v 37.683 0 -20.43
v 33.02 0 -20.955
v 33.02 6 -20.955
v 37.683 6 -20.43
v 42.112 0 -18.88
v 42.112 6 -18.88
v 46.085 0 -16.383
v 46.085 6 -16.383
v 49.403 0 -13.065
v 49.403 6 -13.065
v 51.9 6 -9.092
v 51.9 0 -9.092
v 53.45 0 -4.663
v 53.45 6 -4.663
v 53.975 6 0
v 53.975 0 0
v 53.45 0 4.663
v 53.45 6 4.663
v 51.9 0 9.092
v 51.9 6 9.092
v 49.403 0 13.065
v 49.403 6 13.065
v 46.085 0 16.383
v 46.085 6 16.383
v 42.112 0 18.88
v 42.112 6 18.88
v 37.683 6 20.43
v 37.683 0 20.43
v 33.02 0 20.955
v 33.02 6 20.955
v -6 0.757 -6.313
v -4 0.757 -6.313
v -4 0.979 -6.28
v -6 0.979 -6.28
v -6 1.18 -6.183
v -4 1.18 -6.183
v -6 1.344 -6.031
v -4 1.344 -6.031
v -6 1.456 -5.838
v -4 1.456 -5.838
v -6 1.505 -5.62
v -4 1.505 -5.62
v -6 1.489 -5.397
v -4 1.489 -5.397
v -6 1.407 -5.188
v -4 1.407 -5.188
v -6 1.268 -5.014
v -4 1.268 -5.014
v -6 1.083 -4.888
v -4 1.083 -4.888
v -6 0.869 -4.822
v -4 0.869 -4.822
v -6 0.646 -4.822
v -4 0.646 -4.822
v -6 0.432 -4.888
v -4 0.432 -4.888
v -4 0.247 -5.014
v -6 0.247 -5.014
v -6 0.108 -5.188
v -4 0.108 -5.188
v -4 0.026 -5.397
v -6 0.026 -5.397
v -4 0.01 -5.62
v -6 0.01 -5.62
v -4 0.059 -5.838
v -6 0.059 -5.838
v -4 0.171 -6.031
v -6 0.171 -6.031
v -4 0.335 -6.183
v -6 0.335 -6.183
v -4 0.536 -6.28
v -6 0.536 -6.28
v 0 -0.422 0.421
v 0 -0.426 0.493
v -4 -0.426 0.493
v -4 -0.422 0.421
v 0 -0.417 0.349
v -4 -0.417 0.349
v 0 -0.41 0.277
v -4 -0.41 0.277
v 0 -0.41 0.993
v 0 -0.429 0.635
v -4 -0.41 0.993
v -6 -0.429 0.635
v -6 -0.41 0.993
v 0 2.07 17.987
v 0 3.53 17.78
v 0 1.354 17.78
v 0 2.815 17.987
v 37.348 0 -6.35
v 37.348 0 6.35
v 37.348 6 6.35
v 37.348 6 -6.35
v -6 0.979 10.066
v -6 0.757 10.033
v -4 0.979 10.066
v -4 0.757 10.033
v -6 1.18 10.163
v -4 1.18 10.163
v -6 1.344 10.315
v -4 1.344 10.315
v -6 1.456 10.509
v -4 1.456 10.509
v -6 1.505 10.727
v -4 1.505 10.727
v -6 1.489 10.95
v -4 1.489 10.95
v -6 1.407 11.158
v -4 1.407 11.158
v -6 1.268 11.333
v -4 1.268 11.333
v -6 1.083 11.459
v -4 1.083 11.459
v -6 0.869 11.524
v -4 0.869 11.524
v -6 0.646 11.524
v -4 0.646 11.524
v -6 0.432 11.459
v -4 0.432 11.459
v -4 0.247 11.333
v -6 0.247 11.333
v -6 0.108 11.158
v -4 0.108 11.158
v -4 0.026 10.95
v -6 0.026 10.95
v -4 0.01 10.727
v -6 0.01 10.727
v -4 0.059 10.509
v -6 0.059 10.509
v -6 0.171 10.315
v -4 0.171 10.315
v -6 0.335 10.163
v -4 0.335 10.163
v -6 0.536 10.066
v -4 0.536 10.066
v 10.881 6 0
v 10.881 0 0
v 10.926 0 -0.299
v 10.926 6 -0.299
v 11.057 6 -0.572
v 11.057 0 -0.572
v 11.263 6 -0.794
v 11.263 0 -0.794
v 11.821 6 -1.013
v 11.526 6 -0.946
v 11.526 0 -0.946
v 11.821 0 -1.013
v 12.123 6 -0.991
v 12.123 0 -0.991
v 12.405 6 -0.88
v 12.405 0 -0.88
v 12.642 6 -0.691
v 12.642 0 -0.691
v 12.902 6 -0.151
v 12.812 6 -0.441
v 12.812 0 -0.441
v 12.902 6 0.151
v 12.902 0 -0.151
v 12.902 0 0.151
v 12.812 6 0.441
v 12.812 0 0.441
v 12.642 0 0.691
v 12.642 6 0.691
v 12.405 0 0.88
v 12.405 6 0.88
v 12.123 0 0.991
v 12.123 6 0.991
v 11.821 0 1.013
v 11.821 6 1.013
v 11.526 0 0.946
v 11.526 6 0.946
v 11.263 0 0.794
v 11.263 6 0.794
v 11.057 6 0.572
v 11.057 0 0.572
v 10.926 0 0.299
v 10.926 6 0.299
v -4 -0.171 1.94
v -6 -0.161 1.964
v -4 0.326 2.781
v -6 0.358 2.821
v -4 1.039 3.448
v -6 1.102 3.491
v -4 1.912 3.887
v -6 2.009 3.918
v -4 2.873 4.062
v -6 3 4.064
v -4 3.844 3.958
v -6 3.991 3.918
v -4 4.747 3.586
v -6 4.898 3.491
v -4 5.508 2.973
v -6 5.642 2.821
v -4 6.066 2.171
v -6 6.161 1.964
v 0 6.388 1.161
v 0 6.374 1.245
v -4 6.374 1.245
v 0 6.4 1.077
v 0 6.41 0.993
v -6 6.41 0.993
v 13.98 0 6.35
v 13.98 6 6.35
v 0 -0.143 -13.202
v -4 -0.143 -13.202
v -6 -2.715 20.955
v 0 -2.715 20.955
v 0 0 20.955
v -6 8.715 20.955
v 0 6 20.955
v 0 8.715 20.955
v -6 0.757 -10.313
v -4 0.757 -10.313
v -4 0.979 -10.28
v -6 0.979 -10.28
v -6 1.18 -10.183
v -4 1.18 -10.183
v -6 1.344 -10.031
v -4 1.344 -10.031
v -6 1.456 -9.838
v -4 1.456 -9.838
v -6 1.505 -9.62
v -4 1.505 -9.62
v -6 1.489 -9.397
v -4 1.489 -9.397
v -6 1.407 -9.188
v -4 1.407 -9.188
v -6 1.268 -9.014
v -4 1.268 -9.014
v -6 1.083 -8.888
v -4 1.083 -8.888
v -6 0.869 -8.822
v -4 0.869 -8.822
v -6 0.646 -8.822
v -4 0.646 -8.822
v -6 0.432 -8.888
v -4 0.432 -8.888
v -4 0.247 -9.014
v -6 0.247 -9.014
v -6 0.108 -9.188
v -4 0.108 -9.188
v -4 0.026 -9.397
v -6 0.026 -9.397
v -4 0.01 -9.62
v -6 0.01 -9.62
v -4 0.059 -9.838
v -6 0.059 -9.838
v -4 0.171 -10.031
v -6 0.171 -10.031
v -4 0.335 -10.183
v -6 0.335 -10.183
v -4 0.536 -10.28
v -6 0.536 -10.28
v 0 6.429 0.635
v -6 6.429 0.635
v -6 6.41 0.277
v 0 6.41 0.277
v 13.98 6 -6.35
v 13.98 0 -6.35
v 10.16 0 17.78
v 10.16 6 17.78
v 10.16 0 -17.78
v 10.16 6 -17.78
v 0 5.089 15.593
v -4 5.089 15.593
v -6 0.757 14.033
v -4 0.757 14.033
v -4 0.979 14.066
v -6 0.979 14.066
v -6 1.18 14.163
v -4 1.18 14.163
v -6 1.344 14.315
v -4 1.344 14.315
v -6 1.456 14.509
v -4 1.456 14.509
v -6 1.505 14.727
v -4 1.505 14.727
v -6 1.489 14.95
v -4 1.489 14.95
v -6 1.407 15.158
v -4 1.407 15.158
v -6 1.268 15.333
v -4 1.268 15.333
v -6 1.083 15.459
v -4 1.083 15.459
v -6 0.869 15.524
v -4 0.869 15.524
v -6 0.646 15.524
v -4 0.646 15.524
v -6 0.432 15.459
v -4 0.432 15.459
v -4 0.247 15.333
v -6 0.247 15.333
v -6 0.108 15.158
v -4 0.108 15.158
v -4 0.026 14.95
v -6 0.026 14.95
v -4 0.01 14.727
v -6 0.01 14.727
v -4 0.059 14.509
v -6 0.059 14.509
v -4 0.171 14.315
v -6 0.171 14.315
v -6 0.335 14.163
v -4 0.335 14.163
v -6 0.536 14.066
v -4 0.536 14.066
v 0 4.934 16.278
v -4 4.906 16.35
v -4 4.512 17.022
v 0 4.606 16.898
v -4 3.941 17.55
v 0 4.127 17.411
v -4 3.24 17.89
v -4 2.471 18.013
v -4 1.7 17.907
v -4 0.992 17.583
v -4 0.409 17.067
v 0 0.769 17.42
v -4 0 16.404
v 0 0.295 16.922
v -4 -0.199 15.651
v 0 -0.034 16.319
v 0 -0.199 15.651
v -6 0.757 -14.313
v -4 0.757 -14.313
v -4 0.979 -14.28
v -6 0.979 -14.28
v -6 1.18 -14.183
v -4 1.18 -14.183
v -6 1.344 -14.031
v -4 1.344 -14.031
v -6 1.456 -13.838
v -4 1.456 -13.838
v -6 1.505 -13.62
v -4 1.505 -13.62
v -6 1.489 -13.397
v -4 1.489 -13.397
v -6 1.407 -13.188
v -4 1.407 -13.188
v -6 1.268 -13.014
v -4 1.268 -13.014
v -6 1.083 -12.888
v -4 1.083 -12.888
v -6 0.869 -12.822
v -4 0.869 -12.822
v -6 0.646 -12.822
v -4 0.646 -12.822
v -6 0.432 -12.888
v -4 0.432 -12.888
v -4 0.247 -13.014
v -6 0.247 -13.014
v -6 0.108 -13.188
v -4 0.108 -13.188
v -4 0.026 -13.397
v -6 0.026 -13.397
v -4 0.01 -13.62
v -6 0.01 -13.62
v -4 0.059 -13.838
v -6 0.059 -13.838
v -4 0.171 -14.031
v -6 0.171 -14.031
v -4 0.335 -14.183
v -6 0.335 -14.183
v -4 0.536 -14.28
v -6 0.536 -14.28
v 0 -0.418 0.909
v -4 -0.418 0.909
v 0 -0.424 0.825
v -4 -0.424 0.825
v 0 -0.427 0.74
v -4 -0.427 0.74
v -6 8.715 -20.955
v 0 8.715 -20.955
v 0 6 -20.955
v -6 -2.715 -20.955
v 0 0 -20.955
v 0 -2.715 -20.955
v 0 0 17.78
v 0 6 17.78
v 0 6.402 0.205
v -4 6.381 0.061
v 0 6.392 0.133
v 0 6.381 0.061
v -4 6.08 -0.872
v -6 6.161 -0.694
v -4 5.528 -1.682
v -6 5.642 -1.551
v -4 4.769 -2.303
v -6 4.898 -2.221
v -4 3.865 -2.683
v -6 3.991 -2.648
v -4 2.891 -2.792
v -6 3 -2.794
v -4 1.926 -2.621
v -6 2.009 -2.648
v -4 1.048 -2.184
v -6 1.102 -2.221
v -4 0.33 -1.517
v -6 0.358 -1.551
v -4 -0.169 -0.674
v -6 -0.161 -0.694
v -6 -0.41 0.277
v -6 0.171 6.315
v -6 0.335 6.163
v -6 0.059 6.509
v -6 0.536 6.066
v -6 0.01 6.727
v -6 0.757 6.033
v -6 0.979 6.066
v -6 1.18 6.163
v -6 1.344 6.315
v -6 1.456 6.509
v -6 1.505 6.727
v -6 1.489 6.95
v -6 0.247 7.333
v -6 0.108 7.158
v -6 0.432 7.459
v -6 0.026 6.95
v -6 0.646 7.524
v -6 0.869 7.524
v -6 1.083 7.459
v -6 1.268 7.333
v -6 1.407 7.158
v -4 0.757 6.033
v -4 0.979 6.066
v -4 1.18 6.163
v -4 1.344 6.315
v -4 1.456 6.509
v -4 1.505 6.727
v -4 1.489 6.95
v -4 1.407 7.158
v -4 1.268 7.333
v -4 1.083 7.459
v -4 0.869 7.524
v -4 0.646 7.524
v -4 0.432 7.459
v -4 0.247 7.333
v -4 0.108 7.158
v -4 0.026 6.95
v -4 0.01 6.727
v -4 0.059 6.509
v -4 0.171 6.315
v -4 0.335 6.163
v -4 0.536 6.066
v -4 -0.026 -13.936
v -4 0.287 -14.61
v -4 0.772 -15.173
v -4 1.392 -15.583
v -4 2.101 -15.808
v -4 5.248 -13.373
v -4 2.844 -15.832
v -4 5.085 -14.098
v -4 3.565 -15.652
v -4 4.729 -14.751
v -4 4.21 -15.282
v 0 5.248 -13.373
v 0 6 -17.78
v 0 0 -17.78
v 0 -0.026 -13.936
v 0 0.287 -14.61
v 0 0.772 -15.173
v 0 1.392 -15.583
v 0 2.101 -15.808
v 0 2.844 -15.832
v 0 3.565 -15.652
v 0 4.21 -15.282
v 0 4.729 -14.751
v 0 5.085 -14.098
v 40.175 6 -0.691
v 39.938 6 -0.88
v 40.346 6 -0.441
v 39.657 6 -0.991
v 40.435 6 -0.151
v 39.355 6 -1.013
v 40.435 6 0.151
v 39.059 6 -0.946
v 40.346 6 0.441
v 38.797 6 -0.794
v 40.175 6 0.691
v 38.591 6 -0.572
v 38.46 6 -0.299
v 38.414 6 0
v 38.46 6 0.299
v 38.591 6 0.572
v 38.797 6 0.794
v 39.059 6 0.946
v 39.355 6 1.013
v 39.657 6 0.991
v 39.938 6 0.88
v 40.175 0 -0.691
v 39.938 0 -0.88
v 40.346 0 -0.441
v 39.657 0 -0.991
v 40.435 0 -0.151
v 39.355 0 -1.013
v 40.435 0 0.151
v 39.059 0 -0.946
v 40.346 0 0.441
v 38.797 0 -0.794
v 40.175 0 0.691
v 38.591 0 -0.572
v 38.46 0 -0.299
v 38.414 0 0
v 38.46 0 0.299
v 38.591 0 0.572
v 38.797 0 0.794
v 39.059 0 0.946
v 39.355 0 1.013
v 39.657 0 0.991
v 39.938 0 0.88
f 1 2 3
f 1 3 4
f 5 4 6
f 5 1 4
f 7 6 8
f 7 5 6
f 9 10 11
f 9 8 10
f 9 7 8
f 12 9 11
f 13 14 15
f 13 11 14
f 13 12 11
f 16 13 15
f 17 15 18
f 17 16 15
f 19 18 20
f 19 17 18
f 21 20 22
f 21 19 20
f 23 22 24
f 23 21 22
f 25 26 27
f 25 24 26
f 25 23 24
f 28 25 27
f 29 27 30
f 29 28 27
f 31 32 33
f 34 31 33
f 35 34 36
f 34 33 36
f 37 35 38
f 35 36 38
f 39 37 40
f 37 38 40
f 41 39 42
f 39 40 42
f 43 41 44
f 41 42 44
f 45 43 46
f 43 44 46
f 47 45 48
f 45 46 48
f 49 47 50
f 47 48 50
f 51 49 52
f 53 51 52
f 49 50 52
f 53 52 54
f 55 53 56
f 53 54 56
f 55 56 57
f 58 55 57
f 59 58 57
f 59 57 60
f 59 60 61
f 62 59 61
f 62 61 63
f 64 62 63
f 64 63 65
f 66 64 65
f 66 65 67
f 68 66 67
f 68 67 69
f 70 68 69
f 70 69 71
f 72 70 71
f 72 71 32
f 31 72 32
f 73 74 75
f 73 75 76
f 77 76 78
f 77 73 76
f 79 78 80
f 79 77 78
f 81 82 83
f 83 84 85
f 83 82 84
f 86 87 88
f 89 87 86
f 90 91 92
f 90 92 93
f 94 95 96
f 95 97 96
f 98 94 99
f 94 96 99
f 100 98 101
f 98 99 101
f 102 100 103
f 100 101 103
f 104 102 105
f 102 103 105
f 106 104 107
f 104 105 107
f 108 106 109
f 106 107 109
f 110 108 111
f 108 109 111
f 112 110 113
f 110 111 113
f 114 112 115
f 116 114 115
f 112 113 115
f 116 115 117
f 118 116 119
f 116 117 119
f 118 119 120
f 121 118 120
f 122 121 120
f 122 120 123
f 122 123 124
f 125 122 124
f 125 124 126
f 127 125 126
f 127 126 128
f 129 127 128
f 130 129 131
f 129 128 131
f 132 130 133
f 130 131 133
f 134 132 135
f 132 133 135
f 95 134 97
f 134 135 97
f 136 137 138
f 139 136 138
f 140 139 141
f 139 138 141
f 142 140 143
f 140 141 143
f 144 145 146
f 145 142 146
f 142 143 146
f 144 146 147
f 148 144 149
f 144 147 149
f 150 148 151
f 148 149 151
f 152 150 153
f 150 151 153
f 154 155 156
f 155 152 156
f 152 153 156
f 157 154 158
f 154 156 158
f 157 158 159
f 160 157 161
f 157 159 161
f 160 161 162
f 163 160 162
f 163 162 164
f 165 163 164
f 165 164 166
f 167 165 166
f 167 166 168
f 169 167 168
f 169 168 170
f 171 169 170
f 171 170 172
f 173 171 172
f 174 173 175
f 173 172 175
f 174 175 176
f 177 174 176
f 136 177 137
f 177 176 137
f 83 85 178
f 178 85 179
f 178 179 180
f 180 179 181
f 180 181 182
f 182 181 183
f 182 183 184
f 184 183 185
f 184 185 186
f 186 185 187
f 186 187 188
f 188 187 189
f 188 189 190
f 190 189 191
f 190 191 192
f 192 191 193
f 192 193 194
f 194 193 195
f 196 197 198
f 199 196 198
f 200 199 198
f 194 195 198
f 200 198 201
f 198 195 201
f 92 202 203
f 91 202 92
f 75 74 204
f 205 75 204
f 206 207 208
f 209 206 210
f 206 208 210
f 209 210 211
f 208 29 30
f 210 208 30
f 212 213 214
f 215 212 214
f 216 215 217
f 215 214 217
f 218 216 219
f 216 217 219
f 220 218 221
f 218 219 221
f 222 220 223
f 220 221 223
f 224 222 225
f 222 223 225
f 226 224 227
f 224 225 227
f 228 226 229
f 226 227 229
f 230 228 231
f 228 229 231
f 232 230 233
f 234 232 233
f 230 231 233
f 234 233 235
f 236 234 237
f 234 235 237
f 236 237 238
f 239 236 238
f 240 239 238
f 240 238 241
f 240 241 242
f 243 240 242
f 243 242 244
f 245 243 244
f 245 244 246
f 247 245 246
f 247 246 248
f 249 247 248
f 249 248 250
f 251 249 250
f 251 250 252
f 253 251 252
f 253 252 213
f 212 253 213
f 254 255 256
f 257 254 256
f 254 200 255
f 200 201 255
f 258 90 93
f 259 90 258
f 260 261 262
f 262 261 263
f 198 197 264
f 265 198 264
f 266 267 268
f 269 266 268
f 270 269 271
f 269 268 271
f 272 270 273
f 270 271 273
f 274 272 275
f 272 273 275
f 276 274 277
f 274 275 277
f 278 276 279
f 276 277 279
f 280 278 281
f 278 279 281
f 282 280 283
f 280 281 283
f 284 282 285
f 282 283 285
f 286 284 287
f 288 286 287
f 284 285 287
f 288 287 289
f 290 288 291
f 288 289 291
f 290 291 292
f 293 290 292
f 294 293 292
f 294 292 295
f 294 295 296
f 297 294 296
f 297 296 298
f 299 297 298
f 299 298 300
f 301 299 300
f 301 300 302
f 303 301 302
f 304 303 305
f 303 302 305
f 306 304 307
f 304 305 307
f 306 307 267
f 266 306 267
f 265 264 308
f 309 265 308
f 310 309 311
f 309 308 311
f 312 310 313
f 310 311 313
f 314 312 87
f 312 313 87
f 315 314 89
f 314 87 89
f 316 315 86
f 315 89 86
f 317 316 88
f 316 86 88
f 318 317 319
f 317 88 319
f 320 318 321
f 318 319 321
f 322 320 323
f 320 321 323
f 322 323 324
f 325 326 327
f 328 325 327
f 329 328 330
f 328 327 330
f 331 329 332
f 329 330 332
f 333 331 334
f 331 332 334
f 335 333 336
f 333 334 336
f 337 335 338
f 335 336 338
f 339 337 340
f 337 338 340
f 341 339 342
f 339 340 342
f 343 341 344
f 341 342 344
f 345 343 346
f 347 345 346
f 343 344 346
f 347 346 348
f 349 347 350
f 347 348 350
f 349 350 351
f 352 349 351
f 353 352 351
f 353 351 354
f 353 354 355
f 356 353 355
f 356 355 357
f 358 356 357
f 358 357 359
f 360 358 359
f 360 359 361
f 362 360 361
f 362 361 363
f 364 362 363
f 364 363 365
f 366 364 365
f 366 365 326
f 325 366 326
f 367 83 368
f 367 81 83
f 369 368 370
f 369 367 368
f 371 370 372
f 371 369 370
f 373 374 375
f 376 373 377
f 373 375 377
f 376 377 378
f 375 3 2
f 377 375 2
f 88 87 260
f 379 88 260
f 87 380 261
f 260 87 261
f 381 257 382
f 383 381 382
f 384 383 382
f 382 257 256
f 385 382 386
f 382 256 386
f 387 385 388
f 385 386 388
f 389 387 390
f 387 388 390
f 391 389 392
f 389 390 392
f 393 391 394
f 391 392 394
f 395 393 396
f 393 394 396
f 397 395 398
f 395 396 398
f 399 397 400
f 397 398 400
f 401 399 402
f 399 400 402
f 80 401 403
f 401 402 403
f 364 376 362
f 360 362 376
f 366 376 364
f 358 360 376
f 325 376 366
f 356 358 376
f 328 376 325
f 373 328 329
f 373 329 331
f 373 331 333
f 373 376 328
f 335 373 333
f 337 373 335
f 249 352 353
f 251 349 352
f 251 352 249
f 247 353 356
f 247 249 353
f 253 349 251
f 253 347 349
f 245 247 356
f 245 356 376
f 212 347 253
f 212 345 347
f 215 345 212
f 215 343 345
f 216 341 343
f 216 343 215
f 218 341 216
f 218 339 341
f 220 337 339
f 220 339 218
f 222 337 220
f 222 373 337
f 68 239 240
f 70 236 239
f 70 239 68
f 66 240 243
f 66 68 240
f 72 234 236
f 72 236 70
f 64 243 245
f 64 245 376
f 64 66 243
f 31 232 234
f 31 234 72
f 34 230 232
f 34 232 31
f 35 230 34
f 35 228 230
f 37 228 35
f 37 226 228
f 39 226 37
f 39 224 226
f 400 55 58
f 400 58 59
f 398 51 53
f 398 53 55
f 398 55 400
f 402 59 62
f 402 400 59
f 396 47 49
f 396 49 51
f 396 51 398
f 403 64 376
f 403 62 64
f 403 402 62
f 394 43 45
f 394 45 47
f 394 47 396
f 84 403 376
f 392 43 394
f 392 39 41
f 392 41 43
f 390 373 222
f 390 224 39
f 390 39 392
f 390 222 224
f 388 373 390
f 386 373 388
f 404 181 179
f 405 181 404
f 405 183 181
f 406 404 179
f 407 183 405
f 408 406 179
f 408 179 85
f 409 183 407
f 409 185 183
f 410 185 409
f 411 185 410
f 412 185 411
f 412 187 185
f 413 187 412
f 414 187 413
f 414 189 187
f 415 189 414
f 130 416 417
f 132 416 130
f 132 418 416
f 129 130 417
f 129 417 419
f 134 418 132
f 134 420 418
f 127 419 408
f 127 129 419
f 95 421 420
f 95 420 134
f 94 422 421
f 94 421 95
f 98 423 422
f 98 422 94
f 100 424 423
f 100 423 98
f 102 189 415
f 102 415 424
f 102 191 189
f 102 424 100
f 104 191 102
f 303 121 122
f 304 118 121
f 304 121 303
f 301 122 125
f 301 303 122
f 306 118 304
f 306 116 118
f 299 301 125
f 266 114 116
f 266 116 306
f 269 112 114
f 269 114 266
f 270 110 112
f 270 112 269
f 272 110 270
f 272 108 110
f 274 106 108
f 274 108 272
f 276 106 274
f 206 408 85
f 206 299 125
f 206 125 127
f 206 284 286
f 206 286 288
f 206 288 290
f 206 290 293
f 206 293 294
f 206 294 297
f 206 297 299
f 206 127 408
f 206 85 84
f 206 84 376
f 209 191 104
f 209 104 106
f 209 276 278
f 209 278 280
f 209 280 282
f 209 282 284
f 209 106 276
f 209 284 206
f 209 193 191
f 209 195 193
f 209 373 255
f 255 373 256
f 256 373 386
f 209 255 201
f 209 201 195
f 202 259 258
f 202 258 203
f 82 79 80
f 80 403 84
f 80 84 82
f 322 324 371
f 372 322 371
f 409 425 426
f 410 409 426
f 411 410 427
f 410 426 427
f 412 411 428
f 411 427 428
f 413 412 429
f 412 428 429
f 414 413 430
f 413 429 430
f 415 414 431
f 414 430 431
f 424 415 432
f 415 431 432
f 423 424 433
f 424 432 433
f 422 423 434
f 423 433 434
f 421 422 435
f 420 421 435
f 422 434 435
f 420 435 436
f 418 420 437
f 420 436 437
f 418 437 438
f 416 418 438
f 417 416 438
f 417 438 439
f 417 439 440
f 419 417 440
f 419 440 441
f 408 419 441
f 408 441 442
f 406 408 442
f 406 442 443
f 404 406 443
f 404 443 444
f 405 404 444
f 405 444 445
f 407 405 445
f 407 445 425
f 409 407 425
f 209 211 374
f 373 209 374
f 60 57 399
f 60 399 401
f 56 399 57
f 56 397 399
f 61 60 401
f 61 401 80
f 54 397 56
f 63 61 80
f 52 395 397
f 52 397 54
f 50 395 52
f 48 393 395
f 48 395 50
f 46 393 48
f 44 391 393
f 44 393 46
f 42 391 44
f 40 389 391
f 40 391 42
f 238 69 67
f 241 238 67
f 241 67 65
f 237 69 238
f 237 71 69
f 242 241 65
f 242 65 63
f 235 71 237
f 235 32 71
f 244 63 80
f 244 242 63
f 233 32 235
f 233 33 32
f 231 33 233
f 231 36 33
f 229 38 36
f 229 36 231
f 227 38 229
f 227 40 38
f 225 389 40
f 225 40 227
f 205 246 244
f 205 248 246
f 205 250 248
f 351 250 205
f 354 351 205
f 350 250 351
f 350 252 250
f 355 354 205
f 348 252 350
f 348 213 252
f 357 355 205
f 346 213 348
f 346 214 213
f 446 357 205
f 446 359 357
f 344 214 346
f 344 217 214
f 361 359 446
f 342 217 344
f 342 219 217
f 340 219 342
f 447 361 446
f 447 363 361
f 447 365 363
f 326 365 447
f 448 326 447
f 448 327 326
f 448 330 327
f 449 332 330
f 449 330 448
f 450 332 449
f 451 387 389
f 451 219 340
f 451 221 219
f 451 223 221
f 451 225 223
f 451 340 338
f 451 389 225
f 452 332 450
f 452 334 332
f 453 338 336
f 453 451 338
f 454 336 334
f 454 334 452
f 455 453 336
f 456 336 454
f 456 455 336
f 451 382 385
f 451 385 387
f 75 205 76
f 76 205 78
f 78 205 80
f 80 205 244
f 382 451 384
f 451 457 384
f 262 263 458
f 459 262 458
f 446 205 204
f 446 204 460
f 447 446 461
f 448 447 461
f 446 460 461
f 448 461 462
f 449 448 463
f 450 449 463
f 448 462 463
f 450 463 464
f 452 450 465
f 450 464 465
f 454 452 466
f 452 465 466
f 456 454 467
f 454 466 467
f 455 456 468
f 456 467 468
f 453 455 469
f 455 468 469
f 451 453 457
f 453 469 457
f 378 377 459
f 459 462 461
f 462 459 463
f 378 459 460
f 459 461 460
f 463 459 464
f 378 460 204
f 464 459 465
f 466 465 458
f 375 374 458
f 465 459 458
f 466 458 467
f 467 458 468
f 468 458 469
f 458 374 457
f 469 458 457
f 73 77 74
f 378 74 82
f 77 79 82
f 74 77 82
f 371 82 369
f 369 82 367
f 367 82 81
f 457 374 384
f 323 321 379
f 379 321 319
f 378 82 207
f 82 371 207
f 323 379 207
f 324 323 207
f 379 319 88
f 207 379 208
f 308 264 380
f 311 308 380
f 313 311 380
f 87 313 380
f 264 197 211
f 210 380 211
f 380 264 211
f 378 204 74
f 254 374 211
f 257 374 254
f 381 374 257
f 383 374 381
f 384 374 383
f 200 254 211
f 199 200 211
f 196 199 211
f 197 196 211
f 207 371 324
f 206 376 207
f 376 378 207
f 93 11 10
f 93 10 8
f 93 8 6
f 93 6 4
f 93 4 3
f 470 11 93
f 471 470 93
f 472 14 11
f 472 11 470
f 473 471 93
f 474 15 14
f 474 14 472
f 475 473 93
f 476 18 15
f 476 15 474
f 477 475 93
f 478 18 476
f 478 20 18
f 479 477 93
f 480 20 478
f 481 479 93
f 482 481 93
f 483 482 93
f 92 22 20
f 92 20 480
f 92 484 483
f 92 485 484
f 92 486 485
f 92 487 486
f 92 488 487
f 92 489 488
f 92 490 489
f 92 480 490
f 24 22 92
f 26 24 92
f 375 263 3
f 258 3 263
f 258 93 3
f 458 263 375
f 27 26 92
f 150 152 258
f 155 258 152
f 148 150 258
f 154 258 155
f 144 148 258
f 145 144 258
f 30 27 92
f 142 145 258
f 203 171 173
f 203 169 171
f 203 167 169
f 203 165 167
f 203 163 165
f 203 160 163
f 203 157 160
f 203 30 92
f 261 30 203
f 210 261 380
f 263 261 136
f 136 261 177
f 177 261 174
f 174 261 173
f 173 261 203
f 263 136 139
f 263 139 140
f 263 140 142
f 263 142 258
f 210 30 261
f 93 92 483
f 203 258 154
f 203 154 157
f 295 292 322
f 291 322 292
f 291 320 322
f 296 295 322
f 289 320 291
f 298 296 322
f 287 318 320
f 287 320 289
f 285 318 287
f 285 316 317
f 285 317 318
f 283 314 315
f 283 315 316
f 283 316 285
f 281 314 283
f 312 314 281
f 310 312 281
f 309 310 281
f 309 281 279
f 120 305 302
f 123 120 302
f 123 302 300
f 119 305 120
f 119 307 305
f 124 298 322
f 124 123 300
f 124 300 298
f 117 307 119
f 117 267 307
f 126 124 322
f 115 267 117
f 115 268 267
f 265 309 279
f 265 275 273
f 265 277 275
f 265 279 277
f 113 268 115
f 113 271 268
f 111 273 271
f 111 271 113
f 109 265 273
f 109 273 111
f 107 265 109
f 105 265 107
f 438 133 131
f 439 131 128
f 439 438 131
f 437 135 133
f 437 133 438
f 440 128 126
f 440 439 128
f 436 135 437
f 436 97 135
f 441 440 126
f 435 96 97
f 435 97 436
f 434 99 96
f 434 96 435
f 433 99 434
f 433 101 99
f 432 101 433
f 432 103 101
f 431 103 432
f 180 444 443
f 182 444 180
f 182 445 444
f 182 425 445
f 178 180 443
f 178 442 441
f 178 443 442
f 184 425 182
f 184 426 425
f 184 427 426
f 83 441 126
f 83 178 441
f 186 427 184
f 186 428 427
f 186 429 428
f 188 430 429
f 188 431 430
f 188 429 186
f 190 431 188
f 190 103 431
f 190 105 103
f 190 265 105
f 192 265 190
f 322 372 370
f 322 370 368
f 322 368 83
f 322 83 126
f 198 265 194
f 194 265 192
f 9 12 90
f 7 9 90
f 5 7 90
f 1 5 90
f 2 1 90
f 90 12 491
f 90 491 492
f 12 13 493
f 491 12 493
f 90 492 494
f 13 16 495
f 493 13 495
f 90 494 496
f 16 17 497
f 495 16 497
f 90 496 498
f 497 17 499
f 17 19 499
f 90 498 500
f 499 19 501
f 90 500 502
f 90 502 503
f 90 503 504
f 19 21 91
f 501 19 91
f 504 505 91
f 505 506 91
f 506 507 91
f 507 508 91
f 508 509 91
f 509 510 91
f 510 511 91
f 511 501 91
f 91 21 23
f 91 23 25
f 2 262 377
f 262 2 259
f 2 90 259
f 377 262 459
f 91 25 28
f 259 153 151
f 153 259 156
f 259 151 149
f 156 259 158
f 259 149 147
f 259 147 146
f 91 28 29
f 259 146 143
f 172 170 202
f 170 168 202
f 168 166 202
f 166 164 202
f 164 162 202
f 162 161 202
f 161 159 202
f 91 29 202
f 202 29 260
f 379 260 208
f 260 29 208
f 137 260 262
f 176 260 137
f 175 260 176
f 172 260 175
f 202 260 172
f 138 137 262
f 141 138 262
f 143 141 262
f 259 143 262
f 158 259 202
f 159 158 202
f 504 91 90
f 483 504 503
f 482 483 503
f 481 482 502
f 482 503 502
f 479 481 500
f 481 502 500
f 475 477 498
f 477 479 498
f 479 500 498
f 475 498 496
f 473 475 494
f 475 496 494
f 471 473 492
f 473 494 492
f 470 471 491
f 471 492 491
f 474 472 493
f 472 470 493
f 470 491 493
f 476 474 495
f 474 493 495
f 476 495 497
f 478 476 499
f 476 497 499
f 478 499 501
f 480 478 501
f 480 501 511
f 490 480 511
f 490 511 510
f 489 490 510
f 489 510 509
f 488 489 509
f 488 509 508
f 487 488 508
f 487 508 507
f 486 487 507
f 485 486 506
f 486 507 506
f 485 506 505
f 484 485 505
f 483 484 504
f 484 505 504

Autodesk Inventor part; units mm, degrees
ref_plane "YZ Plane" through (0, 0, 0) normal (1, 0, 0) x (0, 1, 0)
ref_plane "XZ Plane" through (0, 0, 0) normal (0, 1, 0) x (-1, 0, 0)
ref_plane "XY Plane" through (0, 0, 0) normal (0, 0, 1) x (1, 0, 0)
sketch "Sketch1" plane through (0, 0, 0) normal (0, 1, 0) x (-1, 0, 0)
  arc A0 (-33.02, 20.955) -> (-33.02, -20.955) centre (-33.02, 0) ccw
  line L0 (0, 20.955) -> (-33.02, 20.955)
  line L1 (-33.02, -20.955) -> (0, -20.955)
  line L2 (-13.979695, 6.35) -> (-37.347695, 6.35)
  line L3 (-37.347695, 6.35) -> (-37.347695, -6.35)
  line L4 (-37.347695, -6.35) -> (-13.979695, -6.35)
  line L5 (-13.979695, -6.35) -> (-13.979695, 6.35)
  circle A1 centre (-39.430495, 0) radius 1.016
  circle A2 centre (-11.896895, 0) radius 1.016
  line L6 (0, 20.955) -> (0, -20.955)
  point P0 (0, 0)
  point P1 (0, 0)
  point P2 (-37.347695, 0)
  dimension "d1" = 41.91
  dimension "d3" = 12.7
  dimension "d4" = 23.368
  dimension "d5" = 2.032
  dimension "d6" = 2.032
  dimension "d7" = 2.0828
  dimension "d8" = 2.0828
  dimension "d9" = 6.4105
  dimension "d87" = 33.02
  dimension "d88" = 33.02
extrude "Extrusion1" add sketch "Sketch1" along normal blind 6
sketch "Sketch4" plane through (0, 0, -20.955) normal (-1, 0, 0) x (0, 0, 1)
  line L0 (41.91, 8.715) -> (0, 8.715)
  line L1 (0, 8.715) -> (0, -2.715)
  line L2 (0, -2.715) -> (41.91, -2.715)
  line L3 (41.91, -2.715) -> (41.91, 8.715)
  line L4 (0, 0) -> (41.91, 0) projected
  line L5 (41.91, 0) -> (41.91, 6) projected
  point P0 (20.955, 0)
  point P1 (20.955, -2.715)
  point P2 (20.955, 0)
  point P3 (41.91, 3)
  point P4 (41.91, 3)
  dimension "d43" = 41.91
  dimension "d44" = 11.43
extrude "Extrusion4" add sketch "Sketch4" along normal blind 6
sketch "Sketch8" plane through (0, 6, 0) normal (0, 1, 0) x (1, 0, 0)
  line L0 (0, -17.78) -> (10.16, -17.78)
  line L1 (10.16, -17.78) -> (10.16, 17.78)
  line L2 (10.16, 17.78) -> (0, 17.78)
  line L3 (0, 17.78) -> (0, -17.78)
  line L4 (0, -20.955) -> (0, 20.955) projected
  point P0 (0, 0)
  point P1 (0, 0)
  point P2 (0, 0)
  point P3 (0, 0)
  point P4 (0, 0)
  point P5 (0, 0)
  dimension "d74" = 10.16
  dimension "d75" = 35.56
extrude "Extrusion10" cut sketch "Sketch8" against normal blind 16.999991
sketch "Sketch12" plane through (-6, 0, -20.955) normal (-1, 0, 0) x (0, 0, 1)
  line L0 (0, 8.715) -> (0, -2.715)
  line L1 (41.91, -2.715) -> (41.91, 8.715)
  arc A0 (35.512447, 0.300645) -> (35.512447, 5.699355) centre (35.37098, 3) ccw
  line L2 (21.59, -0.429) -> (35.512447, 0.300645)
  line L3 (21.59, 6.429) -> (35.512447, 5.699355)
  circle A1 centre (21.59, 3) radius 3.429
  line L4 (21.59, -0.429) -> (6.703499, 0.351168)
  line L5 (21.59, 6.429) -> (6.703499, 5.648832)
  arc A2 (6.703499, 5.648832) -> (6.703499, 0.351168) centre (6.842318, 3) ccw
  circle A3 centre (15.187051, 3) radius 0.75
  circle A4 centre (11.187051, 3) radius 0.75
  circle A5 centre (7.187051, 3) radius 0.75
  line L6 (21.59, 10.756719) -> (21.59, -4.756719)
  circle A6 centre (27.992949, 3) radius 0.75
  circle A7 centre (31.992949, 3) radius 0.75
  circle A8 centre (35.992949, 3) radius 0.75
  point P0 (34.925, 2)
  point P1 (34.925, 2)
  point P2 (34.925, 2)
  point P3 (14.859, -1.175)
  point P4 (14.859, 5.175)
  point P5 (34.925, 2)
  point P6 (41.91, 3)
  point P7 (38.07404, 3)
  point P8 (41.91, 3)
  point P9 (21.231572, 6.410216)
  point P10 (21.231572, -0.410216)
  point P11 (21.948428, -0.410216)
  point P12 (21.948428, 6.410216)
  point P13 (6.205131, 2.479358)
  point P14 (9.863981, 3)
  point P15 (5.48634, 2.396716)
  point P16 (4.189851, 3)
  point P17 (0, 3)
  point P18 (0, 3)
  point P19 (41.91, 3)
  dimension "d143" = 6
  dimension "d144" = 6.858
  dimension "d145" = 6
  dimension "d146" = 13.78098
  dimension "d147" = 20.32
  dimension "d156" = 1.5
  dimension "d157" = 1.5
  dimension "d158" = 1.5
  dimension "d159" = 4
  dimension "d160" = 4
  dimension "d161" = 2.9972
  dimension "d162" = 17.40015
sketch "Sketch12 outline for Extrusion13" plane through (-6, 0, -20.955) normal (-1, 0, 0) x (0, 0, 1)
  line L0 (21.59, 6.429) -> (21.231572, 6.410216)
  line L1 (21.948428, 6.410216) -> (21.59, 6.429)
  arc A0 (21.948428, -0.410216) -> (21.948428, 6.410216) centre (21.59, 3) ccw
  line L2 (21.59, -0.429) -> (21.948428, -0.410216)
  line L3 (21.231572, -0.410216) -> (21.59, -0.429)
  arc A1 (21.231572, 6.410216) -> (21.231572, -0.410216) centre (21.59, 3) ccw
extrude "Extrusion13" cut sketch "Sketch12 outline for Extrusion13" against normal blind 8.762492
sketch "Sketch17" plane through (0, 0, -20.955) normal (1, 0, 0) x (0, 0, -1)
  arc A0 (-7.753278, -0.143381) -> (-7.582189, 5.248432) centre (-7.80902, 2.557009) ccw
  line L0 (-21.59, -0.429) -> (-7.753278, -0.143381)
  line L1 (-21.59, 6.429) -> (-7.582189, 5.248432)
  circle A1 centre (-21.59, 3) radius 3.429
  line L2 (-21.59, -0.429) -> (-36.606269, -0.19851)
  line L3 (-21.59, 6.429) -> (-36.548101, 5.0886)
  arc A2 (-36.548101, 5.0886) -> (-36.606269, -0.19851) centre (-36.310948, 2.442116) ccw
  arc A3 (-21.231572, -0.410216) -> (-21.231572, 6.410216) centre (-21.59, 3) ccw
  circle A4 centre (-27.970676, 2.471347) radius 0.75
  circle A5 centre (-31.970676, 2.471347) radius 0.75
  circle A6 centre (-35.970676, 2.471347) radius 0.75
  line L4 (-21.59, 6.429) -> (-21.59, -0.429)
  circle A7 centre (-15.209324, 2.471347) radius 0.75
  circle A8 centre (-11.209324, 2.471347) radius 0.75
  circle A9 centre (-7.209324, 2.471347) radius 0.75
  point P0 (-20.955, 0)
  point P1 (-16.352581, -1.161112)
  point P2 (-16.352581, 5.188888)
  point P3 (-5.109414, 2.471347)
  point P4 (-21.695241, -0.427385)
  point P5 (-22.199652, 6.374369)
  point P6 (-21.016089, 6.380631)
  point P7 (-21.448497, -0.426079)
  point P8 (-30.453399, 2.232188)
  point P9 (-26.794548, 2.471347)
  point P10 (-31.172189, 2.149546)
  point P11 (-38.967876, 2.471347)
  dimension "d150" = 6
  dimension "d151" = 6.858
  dimension "d152" = 6
  dimension "d153" = 13.78098
  dimension "d163" = 1.5
  dimension "d164" = 1.5
  dimension "d165" = 1.5
  dimension "d166" = 4
  dimension "d167" = 4
  dimension "d168" = 2.9972
sketch "Sketch17 outline for Extrusion17" plane through (0, 0, -20.955) normal (1, 0, 0) x (0, 0, -1)
  arc A0 (-36.548101, 5.0886) -> (-36.606269, -0.19851) centre (-36.310948, 2.442116) ccw
  line L0 (-22.199652, 6.374369) -> (-36.548101, 5.0886)
  arc A1 (-21.695241, -0.427385) -> (-22.199652, 6.374369) centre (-21.59, 3) cw
  line L1 (-36.606269, -0.19851) -> (-21.695241, -0.427385)
  arc A2 (-7.753278, -0.143381) -> (-7.582189, 5.248432) centre (-7.80902, 2.557009) ccw
  line L2 (-21.448497, -0.426079) -> (-7.753278, -0.143381)
  arc A3 (-21.016089, 6.380631) -> (-21.448497, -0.426079) centre (-21.59, 3) cw
  line L3 (-7.582189, 5.248432) -> (-21.016089, 6.380631)
extrude "Extrusion17" cut sketch "Sketch17 outline for Extrusion17" against normal blind 4
sketch "Sketch19" plane through (-4, 0, -20.955) normal (1, 0, 0) x (0, 0, -1)
  circle A0 centre (-27.7378, 0.757495) radius 0.75
  circle A1 centre (-31.7378, 0.757495) radius 0.75
  circle A2 centre (-35.7378, 0.757495) radius 0.75
  line L0 (-38.735, 6) -> (-38.735, 3.530276)
  line L1 (-21.564652, 3.265138) -> (-21.564652, -1.203525)
  circle A3 centre (-15.391504, 0.757495) radius 0.75
  circle A4 centre (-11.391504, 0.757495) radius 0.75
  circle A5 centre (-7.391504, 0.757495) radius 0.75
  point P0 (-20.955, 0)
  point P1 (-32.395372, 0.835812)
  point P2 (-31.71002, 0.757495)
  point P3 (-38.735, 1.75317)
  point P4 (-38.735, 4.765138)
  dimension "d169" = 1.5
  dimension "d170" = 1.5
  dimension "d171" = 1.5
  dimension "d172" = 4
  dimension "d173" = 4
  dimension "d174" = 2.9972
extrude "Extrusion18" cut sketch "Sketch19" against normal blind 25.4
properties part number "unions2s3pt"
